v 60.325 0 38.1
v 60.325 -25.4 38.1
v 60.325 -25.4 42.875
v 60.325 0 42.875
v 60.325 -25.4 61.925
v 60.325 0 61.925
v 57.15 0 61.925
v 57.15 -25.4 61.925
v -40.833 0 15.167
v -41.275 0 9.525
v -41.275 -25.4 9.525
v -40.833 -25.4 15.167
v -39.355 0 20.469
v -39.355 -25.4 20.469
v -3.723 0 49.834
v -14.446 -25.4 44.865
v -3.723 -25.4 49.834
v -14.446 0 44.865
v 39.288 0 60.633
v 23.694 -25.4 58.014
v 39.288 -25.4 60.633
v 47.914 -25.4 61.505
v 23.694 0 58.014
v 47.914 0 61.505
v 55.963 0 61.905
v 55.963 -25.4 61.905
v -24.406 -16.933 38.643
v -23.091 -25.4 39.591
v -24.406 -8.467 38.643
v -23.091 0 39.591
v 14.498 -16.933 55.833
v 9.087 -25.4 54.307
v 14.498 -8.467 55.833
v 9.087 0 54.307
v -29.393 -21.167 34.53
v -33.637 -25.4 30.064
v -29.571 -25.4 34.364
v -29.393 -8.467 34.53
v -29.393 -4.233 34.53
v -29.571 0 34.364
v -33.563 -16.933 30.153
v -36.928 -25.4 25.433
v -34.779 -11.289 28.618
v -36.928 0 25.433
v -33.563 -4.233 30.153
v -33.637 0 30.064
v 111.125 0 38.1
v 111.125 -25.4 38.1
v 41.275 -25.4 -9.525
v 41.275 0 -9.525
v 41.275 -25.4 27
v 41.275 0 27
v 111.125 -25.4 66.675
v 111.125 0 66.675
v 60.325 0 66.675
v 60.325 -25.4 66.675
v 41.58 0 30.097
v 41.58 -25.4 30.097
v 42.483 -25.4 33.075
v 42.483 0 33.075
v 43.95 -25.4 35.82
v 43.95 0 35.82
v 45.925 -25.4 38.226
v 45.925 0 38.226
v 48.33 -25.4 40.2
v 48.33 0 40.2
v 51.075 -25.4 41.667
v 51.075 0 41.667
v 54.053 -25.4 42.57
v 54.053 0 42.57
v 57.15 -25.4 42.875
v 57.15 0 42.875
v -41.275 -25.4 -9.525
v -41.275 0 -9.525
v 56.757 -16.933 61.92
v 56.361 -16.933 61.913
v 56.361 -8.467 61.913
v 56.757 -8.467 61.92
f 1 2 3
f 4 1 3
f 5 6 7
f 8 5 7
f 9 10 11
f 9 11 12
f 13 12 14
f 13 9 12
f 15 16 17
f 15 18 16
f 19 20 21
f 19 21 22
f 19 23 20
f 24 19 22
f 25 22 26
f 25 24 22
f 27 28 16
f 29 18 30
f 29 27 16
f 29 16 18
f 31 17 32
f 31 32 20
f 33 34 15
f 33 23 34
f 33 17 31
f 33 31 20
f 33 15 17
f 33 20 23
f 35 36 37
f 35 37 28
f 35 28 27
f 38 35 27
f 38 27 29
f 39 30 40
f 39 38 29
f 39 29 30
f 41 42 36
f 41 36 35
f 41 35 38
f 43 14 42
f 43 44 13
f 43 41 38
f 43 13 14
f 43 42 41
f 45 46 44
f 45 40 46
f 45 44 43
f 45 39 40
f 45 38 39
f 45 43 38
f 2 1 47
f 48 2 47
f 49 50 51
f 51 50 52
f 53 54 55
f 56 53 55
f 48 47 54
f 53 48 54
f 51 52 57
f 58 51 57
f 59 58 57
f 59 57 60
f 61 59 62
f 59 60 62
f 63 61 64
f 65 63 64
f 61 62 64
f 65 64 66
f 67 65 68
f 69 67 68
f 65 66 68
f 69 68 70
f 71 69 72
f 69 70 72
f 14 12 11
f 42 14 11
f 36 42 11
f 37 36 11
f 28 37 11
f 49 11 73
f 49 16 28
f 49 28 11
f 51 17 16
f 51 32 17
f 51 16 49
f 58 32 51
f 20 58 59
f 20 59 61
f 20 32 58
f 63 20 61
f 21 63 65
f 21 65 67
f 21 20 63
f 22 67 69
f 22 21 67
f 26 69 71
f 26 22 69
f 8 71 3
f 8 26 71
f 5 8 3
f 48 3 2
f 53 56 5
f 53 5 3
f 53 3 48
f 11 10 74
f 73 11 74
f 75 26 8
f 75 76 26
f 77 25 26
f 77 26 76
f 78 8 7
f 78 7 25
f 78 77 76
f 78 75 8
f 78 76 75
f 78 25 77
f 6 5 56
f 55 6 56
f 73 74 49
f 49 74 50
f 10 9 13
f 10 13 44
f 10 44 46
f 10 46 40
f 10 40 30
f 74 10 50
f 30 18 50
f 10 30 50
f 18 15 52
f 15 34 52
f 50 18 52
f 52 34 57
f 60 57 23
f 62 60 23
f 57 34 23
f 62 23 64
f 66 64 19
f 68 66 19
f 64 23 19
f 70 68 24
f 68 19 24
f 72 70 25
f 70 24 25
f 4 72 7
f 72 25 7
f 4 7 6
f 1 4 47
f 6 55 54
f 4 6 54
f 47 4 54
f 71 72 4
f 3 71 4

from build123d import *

# Parameters (mm, degrees)
F0_W     = 25.4
F0_H     = 4.7498
F0_H_2   = 4.7752
F0_H_3   = 19.05
F1_DEPTH = 25.4


with BuildPart() as f1:
    # F0 (on Front) → F1 (new body)
    with BuildSketch(Plane.XZ):
        Polygon((-41.275, 9.525), (-41.275, -9.525), (41.275, -9.525), (41.275, 9.525), (22.225, 9.525), align=None)
        with BuildLine():
            add(Edge.make_bspline(
                [(-41.275, 9.525), (-41.9137682091, 44.8755109518), (19.7088872763, 61.1237978396), (55.9633224652, 61.9050337831)],
                knots=[0, 0, 0, 0, 110.2917325218, 110.2917325218, 110.2917325218, 110.2917325218], degree=3))
            Line((-41.275, 9.525), (22.225, 9.525))
            Line((22.225, 9.525), (22.225, 27.0002))
            ThreePointArc((22.225, 27.0002), (32.0382463983, 51.2727247152), (55.9633224652, 61.9050337831))
        make_face()
        with Locations((73.025, 64.3001)):
            Rectangle(F0_W, F0_H)
        with Locations((73.025, 40.4876)):
            Rectangle(F0_W, F0_H_2)
        Polygon((85.725, 66.675), (85.725, 61.9252), (85.725, 42.8752), (85.725, 38.1), (111.125, 38.1), (111.125, 66.675), align=None)
        with BuildLine():
            Line((22.225, 9.525), (41.275, 9.525))
            Line((41.275, 9.525), (41.275, 27.0002))
            ThreePointArc((41.275, 27.0002), (45.9246798487, 38.2255201513), (57.15, 42.8752))
            Line((57.15, 42.8752), (60.325, 42.8752))
            Line((60.325, 42.8752), (60.325, 61.9252))
            Line((60.325, 61.9252), (57.15, 61.9252))
            add(Edge.make_bspline(
                [(55.9633224652, 61.9050337831), (56.3619879863, 61.9136245068), (56.757586004, 61.9203449679), (57.15, 61.9252)],
                knots=[110.2917325218, 110.2917325218, 110.2917325218, 110.2917325218, 111.5045361635, 111.5045361635, 111.5045361635, 111.5045361635], degree=3))
            ThreePointArc((55.9633224652, 61.9050337831), (32.0382463983, 51.2727247152), (22.225, 27.0002))
            Line((22.225, 27.0002), (22.225, 9.525))
        make_face()
        with Locations((73.025, 52.4002)):
            Rectangle(F0_W, F0_H_3)
    extrude(amount=F1_DEPTH)


solid = f1.part
